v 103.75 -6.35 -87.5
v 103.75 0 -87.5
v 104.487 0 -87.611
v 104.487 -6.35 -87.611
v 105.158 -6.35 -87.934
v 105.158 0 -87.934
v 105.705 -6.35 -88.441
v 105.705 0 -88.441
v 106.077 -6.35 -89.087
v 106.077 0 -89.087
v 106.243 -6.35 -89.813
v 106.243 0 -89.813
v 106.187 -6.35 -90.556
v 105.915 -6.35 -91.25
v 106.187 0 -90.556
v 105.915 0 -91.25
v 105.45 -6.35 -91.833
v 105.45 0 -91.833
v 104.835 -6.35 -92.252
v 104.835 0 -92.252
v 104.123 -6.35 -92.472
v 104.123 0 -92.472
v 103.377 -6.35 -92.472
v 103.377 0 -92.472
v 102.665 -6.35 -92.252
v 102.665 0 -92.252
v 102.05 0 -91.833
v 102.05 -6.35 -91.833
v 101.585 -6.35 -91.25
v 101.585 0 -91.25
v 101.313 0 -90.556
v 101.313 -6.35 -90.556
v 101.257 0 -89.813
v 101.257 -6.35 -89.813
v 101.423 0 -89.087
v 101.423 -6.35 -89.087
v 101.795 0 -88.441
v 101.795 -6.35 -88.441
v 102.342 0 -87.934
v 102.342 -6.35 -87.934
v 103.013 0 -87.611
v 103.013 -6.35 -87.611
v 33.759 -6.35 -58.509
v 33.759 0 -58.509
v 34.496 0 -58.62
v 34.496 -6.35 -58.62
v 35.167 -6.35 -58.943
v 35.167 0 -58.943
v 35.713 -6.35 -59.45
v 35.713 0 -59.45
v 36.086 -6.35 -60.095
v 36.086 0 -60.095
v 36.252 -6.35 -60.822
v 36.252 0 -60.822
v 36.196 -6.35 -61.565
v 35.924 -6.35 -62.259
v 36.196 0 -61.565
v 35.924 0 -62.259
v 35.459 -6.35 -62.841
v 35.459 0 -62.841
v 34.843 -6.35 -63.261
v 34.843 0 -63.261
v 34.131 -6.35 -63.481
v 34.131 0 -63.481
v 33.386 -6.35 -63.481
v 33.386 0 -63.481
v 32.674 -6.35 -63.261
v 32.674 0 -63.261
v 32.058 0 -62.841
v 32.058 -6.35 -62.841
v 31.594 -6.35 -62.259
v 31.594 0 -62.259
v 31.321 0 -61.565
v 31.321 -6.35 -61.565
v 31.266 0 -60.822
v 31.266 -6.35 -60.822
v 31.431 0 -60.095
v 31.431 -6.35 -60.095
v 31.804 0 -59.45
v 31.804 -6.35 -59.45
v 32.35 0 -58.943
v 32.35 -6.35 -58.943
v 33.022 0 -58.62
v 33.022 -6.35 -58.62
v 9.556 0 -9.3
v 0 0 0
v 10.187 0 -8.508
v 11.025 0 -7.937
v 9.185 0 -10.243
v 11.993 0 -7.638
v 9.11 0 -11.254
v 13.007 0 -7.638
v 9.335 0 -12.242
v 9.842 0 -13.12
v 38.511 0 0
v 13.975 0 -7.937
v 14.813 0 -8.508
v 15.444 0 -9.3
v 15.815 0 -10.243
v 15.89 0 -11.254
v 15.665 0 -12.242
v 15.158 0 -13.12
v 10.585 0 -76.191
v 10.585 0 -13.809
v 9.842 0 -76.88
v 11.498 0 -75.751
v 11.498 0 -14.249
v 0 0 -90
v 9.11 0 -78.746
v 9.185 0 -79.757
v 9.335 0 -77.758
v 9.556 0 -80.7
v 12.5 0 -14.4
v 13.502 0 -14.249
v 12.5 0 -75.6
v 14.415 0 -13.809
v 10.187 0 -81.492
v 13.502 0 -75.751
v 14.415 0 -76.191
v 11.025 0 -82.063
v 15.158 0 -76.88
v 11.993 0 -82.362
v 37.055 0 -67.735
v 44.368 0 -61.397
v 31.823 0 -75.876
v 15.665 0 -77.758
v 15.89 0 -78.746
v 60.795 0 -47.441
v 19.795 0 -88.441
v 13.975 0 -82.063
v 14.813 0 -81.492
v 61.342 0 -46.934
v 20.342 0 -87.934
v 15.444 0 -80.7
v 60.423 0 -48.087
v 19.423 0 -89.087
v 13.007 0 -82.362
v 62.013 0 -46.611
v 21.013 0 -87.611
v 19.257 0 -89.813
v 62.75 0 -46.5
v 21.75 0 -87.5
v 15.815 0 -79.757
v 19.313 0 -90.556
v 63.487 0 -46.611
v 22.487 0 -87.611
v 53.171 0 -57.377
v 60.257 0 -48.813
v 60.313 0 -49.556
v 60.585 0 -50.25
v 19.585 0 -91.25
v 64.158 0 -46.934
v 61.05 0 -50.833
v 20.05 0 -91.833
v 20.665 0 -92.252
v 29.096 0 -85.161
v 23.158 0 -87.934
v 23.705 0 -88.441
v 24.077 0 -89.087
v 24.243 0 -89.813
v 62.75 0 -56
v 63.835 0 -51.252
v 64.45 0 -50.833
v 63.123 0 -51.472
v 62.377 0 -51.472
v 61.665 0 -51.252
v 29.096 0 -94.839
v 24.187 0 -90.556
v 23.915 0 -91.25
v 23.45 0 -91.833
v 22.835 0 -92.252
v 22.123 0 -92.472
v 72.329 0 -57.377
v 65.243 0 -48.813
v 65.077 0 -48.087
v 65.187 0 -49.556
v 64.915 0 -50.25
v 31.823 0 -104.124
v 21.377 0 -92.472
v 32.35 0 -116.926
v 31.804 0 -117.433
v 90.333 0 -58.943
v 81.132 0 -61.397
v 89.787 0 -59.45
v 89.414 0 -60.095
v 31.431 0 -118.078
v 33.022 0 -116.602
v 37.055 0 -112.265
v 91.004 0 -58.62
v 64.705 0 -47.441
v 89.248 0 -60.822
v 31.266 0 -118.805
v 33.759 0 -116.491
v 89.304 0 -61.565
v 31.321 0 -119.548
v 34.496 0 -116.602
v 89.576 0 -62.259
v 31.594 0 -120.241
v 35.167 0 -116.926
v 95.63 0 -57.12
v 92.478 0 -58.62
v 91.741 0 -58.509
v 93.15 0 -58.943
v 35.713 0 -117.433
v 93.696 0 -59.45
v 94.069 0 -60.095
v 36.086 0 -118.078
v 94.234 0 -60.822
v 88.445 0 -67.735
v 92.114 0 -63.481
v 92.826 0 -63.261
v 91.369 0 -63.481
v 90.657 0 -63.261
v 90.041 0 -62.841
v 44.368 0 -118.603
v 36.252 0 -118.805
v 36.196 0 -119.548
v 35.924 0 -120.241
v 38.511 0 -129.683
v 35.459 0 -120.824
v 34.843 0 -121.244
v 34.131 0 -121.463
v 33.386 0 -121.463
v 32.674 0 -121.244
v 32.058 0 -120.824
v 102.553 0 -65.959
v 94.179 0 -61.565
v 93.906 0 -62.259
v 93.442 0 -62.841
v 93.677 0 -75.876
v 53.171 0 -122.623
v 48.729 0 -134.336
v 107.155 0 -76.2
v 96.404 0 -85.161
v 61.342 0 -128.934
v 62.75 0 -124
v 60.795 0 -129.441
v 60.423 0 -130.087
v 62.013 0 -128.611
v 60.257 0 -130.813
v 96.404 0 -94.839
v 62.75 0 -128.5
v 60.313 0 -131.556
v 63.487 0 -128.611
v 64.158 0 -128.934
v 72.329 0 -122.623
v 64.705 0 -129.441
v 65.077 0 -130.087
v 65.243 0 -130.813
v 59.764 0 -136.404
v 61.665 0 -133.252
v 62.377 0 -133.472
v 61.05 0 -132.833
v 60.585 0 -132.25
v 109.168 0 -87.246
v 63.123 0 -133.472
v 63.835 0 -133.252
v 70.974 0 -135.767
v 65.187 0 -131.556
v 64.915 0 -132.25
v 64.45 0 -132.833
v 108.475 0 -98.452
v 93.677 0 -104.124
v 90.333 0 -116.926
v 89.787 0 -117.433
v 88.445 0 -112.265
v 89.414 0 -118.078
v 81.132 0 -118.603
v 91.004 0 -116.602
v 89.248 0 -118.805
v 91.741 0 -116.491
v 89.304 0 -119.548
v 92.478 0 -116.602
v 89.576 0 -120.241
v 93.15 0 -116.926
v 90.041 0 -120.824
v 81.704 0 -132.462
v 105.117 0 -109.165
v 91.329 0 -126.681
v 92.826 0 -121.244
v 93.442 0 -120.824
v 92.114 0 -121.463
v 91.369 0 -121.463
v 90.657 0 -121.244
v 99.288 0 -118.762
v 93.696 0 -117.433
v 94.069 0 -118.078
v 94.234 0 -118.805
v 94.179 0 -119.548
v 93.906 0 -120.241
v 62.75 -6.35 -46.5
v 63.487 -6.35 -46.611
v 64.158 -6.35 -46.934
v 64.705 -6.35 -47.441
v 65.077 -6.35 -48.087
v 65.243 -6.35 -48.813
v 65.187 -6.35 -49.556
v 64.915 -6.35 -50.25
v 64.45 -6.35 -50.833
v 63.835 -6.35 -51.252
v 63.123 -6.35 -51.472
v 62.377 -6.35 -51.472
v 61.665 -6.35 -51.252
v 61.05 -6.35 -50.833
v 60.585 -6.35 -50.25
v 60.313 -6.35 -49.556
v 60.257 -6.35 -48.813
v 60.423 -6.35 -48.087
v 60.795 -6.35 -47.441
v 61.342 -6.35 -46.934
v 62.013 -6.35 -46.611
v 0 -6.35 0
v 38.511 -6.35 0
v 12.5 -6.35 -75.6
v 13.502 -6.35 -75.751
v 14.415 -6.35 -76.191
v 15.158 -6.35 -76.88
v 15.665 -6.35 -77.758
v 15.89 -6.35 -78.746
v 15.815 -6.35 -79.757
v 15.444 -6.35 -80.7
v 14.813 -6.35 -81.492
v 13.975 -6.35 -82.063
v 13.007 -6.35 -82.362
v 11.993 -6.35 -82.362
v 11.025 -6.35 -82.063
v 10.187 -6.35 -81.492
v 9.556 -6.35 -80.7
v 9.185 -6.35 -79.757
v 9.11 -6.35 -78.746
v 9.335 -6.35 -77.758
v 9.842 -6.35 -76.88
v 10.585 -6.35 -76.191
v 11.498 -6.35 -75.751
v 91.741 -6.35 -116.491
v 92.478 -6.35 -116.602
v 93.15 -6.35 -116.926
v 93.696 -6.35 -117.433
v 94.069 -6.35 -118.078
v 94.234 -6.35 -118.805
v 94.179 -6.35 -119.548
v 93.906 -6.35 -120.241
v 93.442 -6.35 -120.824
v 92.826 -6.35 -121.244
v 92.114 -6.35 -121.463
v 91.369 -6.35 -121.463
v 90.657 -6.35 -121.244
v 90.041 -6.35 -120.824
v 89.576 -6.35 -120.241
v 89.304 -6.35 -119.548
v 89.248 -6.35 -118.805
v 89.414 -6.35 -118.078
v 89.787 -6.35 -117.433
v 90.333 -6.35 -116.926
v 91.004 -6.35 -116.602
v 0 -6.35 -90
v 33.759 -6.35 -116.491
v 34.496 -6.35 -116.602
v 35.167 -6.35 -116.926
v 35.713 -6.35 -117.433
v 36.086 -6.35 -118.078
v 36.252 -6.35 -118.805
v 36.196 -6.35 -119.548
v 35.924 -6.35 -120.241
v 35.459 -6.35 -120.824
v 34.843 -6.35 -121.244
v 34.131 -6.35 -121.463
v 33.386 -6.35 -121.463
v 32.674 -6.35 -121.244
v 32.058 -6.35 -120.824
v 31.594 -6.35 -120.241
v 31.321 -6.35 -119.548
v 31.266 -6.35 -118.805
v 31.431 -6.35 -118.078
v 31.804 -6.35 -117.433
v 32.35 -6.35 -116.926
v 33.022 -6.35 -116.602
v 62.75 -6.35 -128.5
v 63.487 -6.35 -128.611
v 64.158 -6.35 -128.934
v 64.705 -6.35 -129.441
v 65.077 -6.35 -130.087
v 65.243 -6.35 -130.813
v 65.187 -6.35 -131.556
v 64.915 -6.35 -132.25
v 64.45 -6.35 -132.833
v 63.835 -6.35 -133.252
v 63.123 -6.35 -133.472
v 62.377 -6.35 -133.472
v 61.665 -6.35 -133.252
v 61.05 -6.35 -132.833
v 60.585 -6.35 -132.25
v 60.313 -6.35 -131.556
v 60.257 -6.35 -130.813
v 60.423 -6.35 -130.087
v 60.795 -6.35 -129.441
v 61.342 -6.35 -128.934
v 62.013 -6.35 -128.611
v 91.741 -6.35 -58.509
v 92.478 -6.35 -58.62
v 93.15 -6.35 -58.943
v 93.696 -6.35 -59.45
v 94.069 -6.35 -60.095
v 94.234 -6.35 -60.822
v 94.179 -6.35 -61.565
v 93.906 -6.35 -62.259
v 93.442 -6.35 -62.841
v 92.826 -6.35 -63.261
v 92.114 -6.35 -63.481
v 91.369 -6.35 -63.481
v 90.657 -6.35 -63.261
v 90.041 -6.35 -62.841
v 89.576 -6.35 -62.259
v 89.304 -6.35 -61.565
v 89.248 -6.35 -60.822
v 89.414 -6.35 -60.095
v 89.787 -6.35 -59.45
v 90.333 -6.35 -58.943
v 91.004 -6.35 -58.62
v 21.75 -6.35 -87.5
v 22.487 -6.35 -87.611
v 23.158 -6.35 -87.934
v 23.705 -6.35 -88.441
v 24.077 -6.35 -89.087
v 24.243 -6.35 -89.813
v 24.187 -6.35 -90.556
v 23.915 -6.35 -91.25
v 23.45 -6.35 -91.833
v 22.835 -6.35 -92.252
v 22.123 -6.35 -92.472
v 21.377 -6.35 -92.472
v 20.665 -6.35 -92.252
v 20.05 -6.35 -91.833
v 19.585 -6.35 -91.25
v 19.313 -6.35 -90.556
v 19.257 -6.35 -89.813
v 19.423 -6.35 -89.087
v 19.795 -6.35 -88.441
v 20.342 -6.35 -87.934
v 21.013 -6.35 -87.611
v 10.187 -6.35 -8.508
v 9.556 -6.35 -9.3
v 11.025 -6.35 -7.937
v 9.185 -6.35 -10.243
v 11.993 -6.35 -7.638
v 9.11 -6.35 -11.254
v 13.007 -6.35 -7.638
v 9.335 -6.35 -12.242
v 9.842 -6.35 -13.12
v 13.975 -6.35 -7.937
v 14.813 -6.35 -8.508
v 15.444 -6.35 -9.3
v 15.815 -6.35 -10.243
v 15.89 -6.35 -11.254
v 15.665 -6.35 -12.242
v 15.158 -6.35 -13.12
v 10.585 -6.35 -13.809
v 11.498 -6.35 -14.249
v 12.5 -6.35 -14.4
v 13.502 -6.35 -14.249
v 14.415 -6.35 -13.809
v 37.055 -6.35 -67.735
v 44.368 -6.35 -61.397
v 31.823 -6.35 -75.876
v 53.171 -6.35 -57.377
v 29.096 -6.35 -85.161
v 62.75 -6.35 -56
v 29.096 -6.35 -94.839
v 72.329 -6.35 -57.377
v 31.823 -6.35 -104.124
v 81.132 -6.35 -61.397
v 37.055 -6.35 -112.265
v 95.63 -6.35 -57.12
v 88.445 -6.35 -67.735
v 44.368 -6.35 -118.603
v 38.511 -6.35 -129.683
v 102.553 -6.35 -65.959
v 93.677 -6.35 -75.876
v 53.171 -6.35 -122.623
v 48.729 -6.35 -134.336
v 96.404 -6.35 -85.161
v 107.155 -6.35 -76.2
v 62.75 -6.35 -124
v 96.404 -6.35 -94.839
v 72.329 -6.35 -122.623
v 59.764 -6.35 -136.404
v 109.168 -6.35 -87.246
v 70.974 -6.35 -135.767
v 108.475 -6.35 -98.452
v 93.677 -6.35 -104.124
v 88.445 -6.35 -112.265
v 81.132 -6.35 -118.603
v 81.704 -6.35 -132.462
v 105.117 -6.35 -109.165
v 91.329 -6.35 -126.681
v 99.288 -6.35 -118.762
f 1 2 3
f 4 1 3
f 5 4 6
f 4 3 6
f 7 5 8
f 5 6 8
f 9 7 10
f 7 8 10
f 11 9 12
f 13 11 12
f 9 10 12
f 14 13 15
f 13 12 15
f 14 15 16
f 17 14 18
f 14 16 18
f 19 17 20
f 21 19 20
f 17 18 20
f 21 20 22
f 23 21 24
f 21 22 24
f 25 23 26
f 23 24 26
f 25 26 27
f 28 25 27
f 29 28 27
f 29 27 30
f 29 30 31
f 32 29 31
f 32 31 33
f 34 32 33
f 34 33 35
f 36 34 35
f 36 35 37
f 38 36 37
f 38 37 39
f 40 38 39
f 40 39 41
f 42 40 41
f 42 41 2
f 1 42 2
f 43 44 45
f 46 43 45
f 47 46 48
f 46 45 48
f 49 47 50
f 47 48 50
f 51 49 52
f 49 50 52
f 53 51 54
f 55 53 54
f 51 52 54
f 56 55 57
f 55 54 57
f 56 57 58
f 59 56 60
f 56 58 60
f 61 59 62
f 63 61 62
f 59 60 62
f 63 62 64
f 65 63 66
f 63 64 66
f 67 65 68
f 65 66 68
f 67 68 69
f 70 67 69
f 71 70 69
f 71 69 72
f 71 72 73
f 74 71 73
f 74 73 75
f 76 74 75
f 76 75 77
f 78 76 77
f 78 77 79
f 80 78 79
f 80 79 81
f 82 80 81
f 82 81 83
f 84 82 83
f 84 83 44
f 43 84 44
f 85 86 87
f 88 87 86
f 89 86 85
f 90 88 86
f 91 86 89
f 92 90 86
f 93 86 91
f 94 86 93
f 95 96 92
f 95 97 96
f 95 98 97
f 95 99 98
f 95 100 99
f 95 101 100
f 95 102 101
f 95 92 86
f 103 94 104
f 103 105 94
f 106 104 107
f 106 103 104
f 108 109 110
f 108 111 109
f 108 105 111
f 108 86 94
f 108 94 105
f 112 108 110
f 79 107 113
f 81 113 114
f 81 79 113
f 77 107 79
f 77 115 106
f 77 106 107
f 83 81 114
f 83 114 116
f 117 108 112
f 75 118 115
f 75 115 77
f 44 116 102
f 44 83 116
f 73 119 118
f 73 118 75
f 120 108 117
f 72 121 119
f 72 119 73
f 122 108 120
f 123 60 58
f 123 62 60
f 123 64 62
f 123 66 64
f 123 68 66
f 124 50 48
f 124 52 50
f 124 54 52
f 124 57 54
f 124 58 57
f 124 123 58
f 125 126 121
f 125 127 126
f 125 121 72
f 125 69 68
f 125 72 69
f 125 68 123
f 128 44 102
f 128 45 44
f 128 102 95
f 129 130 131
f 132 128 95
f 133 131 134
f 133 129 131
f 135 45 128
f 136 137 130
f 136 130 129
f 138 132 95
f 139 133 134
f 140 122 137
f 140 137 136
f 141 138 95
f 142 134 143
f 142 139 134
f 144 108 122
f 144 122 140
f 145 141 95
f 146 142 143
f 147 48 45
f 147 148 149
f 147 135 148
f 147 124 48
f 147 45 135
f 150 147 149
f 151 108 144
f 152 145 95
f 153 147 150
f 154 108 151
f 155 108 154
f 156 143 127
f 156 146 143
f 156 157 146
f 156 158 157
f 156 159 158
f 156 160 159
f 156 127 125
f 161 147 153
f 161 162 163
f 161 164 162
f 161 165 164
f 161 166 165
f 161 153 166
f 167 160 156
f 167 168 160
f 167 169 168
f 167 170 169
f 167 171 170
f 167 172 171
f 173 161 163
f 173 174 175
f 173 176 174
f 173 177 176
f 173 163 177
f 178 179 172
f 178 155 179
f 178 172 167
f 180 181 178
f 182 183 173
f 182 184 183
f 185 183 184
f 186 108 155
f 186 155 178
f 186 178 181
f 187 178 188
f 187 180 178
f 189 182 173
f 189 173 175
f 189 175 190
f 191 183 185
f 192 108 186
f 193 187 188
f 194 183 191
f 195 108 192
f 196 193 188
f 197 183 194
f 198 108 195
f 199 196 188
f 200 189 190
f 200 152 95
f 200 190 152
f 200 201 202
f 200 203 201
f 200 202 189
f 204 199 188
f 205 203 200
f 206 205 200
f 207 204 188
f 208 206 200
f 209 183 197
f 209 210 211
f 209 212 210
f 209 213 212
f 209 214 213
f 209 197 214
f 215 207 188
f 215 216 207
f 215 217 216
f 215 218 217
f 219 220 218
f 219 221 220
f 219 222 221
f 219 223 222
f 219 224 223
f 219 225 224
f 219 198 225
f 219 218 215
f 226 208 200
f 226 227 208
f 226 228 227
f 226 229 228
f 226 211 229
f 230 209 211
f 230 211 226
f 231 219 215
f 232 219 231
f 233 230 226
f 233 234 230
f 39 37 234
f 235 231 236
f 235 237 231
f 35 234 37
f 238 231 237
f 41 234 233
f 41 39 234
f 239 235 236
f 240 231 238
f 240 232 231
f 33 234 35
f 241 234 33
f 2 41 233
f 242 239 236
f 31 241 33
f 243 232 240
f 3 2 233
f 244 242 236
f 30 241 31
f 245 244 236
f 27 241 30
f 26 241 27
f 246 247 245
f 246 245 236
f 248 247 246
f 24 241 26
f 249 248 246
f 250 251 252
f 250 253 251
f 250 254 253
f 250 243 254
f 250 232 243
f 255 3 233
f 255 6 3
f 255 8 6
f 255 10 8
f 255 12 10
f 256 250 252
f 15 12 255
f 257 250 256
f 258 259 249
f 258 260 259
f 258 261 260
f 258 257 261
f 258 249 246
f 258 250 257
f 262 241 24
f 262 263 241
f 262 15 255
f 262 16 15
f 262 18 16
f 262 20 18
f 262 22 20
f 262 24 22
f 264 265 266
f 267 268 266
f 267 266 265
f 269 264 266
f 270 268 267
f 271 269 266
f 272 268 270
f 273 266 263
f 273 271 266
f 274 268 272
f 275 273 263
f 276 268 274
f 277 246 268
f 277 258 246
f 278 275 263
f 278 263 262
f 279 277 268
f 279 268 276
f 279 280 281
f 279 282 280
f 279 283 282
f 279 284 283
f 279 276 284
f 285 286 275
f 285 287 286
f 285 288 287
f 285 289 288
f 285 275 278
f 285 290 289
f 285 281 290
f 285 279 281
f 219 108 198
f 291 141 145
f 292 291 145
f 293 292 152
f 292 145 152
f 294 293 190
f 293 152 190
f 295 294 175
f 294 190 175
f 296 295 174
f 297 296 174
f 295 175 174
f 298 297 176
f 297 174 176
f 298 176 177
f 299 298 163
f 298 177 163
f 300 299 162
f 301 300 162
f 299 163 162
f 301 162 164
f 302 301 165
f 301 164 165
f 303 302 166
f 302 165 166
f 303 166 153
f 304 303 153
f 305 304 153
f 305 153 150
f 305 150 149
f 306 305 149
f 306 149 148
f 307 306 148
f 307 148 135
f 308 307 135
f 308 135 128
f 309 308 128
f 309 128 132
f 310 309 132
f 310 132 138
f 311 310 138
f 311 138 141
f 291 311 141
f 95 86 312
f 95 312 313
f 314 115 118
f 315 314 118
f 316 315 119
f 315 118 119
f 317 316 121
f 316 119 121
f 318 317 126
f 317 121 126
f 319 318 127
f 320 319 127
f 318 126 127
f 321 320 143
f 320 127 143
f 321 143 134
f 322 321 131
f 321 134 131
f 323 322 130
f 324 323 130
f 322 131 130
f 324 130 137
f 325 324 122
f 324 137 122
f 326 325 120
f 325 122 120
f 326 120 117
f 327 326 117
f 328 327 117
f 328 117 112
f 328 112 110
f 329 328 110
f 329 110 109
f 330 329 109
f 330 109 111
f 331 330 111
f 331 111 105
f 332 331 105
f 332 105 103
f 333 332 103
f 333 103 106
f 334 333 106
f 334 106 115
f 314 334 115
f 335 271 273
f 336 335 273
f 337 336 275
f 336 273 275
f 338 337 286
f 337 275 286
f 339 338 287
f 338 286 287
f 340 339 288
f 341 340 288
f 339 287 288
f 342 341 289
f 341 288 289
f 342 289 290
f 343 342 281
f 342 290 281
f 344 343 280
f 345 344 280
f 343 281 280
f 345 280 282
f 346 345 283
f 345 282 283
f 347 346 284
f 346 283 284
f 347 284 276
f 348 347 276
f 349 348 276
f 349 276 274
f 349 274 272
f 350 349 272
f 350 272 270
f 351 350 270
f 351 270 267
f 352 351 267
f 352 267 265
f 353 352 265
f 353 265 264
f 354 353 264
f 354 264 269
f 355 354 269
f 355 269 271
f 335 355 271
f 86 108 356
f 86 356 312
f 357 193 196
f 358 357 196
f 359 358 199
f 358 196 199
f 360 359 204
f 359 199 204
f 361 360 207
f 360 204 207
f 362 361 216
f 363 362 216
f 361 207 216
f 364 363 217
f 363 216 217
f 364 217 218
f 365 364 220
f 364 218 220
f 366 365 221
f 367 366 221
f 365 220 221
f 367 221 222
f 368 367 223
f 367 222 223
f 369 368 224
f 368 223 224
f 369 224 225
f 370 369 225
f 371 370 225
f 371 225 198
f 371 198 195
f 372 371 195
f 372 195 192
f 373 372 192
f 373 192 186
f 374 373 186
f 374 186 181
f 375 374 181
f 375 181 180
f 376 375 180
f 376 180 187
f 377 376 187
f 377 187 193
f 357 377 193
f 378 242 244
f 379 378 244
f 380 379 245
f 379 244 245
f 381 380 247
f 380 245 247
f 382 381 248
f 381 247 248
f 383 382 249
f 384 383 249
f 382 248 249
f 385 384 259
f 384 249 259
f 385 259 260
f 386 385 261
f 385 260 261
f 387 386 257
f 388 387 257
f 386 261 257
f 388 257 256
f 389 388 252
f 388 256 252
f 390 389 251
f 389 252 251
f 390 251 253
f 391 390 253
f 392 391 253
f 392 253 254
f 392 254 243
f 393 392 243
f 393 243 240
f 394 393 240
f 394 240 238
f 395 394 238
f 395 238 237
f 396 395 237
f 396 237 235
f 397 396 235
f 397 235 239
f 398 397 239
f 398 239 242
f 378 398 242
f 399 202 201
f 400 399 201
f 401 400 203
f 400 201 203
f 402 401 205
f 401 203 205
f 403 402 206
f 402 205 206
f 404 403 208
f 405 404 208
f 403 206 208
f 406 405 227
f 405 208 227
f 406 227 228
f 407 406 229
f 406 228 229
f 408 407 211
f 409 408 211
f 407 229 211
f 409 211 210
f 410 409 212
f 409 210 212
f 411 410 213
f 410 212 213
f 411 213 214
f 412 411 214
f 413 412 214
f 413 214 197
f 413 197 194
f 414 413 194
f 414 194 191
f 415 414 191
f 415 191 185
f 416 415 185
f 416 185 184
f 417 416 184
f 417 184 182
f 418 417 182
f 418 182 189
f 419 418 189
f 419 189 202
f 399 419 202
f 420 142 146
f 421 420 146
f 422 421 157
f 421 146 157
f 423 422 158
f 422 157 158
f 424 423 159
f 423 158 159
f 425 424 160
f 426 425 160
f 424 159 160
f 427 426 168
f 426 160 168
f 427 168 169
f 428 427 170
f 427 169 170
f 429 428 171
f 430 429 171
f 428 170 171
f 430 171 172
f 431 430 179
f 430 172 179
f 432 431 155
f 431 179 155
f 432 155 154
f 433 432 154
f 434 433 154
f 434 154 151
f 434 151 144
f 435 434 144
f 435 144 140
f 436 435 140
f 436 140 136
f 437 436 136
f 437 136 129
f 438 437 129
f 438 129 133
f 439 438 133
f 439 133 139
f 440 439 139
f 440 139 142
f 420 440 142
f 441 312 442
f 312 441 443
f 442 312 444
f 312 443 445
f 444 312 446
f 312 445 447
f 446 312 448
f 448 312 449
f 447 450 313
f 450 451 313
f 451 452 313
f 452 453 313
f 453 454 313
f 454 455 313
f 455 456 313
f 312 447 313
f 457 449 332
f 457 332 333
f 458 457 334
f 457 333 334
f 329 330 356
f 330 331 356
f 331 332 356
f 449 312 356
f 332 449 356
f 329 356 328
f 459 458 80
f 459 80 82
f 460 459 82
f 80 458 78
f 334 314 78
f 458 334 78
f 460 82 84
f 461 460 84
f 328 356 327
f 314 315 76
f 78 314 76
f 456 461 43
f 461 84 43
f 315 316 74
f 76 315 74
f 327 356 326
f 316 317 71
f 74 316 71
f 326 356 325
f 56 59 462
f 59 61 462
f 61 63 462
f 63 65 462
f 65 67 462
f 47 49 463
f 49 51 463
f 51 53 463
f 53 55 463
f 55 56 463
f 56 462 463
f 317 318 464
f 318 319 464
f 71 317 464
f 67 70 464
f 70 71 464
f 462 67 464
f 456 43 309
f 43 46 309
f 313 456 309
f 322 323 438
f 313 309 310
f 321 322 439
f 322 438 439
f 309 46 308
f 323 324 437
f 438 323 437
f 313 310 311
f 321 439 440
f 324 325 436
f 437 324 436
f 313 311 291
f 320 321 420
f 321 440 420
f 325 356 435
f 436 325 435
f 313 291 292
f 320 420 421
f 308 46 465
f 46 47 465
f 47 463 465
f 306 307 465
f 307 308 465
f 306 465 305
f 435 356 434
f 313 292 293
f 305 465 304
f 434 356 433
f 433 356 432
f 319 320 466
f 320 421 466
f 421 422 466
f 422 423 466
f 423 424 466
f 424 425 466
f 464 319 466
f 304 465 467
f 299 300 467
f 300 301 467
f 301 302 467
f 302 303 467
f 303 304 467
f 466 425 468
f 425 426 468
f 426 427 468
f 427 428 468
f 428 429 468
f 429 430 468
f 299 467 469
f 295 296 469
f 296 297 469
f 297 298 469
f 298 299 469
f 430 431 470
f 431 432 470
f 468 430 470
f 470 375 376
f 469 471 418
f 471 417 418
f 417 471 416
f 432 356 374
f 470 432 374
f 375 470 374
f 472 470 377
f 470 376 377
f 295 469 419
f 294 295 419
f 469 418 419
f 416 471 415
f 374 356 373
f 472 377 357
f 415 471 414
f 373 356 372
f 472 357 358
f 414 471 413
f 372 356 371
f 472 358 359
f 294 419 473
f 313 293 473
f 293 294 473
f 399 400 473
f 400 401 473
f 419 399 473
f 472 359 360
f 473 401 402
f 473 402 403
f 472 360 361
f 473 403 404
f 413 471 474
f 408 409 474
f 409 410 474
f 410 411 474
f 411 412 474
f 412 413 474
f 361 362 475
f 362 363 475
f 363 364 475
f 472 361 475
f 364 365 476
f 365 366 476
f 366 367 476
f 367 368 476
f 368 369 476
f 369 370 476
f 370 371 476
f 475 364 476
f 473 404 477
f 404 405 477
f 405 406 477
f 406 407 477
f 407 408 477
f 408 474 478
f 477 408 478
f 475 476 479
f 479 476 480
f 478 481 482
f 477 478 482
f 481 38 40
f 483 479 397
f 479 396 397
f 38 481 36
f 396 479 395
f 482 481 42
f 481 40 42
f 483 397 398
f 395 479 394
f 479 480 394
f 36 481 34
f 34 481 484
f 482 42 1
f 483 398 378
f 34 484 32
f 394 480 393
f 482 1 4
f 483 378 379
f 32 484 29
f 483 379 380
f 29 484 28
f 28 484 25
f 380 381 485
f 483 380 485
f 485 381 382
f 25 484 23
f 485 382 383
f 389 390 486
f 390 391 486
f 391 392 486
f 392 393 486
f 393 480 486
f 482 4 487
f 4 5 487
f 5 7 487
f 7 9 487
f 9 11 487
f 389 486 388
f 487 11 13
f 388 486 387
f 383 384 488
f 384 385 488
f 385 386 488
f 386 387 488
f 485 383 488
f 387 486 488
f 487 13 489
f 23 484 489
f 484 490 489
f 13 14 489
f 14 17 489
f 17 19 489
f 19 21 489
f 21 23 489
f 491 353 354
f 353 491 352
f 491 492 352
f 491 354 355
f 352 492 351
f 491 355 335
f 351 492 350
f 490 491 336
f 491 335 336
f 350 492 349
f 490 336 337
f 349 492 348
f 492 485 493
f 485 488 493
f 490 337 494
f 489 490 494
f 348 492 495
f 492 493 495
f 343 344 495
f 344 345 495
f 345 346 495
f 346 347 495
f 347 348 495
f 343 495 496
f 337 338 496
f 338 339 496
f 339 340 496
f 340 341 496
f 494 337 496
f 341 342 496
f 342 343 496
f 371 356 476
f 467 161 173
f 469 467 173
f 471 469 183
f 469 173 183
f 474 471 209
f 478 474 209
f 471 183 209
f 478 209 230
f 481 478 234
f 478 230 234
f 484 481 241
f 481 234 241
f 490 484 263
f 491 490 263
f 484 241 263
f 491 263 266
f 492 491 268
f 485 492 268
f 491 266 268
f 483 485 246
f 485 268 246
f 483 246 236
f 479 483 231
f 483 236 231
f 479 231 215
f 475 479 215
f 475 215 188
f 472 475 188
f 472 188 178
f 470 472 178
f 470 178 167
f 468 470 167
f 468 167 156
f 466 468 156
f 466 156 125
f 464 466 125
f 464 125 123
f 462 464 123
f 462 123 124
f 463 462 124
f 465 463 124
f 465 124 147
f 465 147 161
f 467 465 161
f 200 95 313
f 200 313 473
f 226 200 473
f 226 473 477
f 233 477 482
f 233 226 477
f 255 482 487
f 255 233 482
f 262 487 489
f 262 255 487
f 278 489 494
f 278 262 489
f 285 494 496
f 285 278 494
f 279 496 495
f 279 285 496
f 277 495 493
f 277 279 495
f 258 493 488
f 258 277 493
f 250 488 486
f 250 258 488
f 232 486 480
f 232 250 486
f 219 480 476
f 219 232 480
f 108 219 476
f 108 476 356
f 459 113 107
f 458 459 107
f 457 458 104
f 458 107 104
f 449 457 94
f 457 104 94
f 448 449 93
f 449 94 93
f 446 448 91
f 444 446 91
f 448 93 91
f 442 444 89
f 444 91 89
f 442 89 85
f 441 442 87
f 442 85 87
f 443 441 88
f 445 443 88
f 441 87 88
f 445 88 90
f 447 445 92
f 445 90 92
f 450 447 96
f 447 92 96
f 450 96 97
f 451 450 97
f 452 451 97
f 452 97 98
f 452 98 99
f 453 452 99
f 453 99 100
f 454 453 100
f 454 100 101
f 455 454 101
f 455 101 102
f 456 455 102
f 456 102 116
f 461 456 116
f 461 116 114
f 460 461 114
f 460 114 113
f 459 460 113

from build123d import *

# Parameters (mm, degrees)
BASE_FLANGE1_DEPTH = 6.35
SKETCH8_R          = 3.4
CUT_EXTRUDE1_DEPTH = 175.95180765
SKETCH9_R          = 34
CUT_EXTRUDE2_DEPTH = 175.95180765
SKETCH10_R         = 2.5
CUT_EXTRUDE3_DEPTH = 175.95180765


# Sheet-metal steps are written as plain solids
with BuildPart() as part:
    # Sketch2 → Base-Flange1 (new body)
    with BuildSketch(Plane(origin=(0, 0, 0), x_dir=(1, 0, 0), z_dir=(0, 1, 0))):
        with BuildLine():
            Line((0, 0), (38.51093065, 0))
            Line((38.51093065, 0), (95.630465325, 57.119534675))
            ThreePointArc((95.630465325, 57.119534675), (99.287953618, 118.761570635), (38.51093065, 129.682710556))
            Line((38.51093065, 129.682710556), (0, 90))
            Line((0, 90), (0, 0))
        make_face()
    extrude(amount=-BASE_FLANGE1_DEPTH)

    # Sketch8 → Cut-Extrude1 (cut, through all)
    with BuildSketch(Plane(origin=(0, 0, 0), x_dir=(1, 0, 0), z_dir=(0, 1, 0))):
        with Locations(Location((12.5, 79, 0), (0, 0, 270))):
            Circle(SKETCH8_R)
        with Locations(Location((12.5, 11, 0), (0, 0, 90))):
            Circle(SKETCH8_R)
    extrude(amount=-CUT_EXTRUDE1_DEPTH, mode=Mode.SUBTRACT)

    # Sketch9 → Cut-Extrude2 (cut, through all)
    with BuildSketch(Plane(origin=(0, 0, 0), x_dir=(1, 0, 0), z_dir=(0, 1, 0))):
        with Locations(Location((62.75, 90, 0), (0, 0, 270))):
            Circle(SKETCH9_R)
    extrude(amount=-CUT_EXTRUDE2_DEPTH, mode=Mode.SUBTRACT)

    # Sketch10 → Cut-Extrude3 (cut, through all)
    with BuildSketch(Plane(origin=(0, 0, 0), x_dir=(1, 0, 0), z_dir=(0, 1, 0))):
        with Locations(Location((62.75, 131, 0), (0, 0, 270))):
            Circle(SKETCH10_R)
        with Locations(Location((91.741378029, 118.991378029, 0), (0, 0, 270))):
            Circle(SKETCH10_R)
        with Locations(Location((103.75, 90, 0), (0, 0, 270))):
            Circle(SKETCH10_R)
        with Locations(Location((91.741378029, 61.008621971, 0), (0, 0, 270))):
            Circle(SKETCH10_R)
        with Locations(Location((62.75, 49, 0), (0, 0, 270))):
            Circle(SKETCH10_R)
        with Locations(Location((33.758621971, 61.008621971, 0), (0, 0, 270))):
            Circle(SKETCH10_R)
        with Locations(Location((21.75, 90, 0), (0, 0, 270))):
            Circle(SKETCH10_R)
        with Locations(Location((33.758621971, 118.991378029, 0), (0, 0, 270))):
            Circle(SKETCH10_R)
    extrude(amount=-CUT_EXTRUDE3_DEPTH, mode=Mode.SUBTRACT)


solid = part.part
